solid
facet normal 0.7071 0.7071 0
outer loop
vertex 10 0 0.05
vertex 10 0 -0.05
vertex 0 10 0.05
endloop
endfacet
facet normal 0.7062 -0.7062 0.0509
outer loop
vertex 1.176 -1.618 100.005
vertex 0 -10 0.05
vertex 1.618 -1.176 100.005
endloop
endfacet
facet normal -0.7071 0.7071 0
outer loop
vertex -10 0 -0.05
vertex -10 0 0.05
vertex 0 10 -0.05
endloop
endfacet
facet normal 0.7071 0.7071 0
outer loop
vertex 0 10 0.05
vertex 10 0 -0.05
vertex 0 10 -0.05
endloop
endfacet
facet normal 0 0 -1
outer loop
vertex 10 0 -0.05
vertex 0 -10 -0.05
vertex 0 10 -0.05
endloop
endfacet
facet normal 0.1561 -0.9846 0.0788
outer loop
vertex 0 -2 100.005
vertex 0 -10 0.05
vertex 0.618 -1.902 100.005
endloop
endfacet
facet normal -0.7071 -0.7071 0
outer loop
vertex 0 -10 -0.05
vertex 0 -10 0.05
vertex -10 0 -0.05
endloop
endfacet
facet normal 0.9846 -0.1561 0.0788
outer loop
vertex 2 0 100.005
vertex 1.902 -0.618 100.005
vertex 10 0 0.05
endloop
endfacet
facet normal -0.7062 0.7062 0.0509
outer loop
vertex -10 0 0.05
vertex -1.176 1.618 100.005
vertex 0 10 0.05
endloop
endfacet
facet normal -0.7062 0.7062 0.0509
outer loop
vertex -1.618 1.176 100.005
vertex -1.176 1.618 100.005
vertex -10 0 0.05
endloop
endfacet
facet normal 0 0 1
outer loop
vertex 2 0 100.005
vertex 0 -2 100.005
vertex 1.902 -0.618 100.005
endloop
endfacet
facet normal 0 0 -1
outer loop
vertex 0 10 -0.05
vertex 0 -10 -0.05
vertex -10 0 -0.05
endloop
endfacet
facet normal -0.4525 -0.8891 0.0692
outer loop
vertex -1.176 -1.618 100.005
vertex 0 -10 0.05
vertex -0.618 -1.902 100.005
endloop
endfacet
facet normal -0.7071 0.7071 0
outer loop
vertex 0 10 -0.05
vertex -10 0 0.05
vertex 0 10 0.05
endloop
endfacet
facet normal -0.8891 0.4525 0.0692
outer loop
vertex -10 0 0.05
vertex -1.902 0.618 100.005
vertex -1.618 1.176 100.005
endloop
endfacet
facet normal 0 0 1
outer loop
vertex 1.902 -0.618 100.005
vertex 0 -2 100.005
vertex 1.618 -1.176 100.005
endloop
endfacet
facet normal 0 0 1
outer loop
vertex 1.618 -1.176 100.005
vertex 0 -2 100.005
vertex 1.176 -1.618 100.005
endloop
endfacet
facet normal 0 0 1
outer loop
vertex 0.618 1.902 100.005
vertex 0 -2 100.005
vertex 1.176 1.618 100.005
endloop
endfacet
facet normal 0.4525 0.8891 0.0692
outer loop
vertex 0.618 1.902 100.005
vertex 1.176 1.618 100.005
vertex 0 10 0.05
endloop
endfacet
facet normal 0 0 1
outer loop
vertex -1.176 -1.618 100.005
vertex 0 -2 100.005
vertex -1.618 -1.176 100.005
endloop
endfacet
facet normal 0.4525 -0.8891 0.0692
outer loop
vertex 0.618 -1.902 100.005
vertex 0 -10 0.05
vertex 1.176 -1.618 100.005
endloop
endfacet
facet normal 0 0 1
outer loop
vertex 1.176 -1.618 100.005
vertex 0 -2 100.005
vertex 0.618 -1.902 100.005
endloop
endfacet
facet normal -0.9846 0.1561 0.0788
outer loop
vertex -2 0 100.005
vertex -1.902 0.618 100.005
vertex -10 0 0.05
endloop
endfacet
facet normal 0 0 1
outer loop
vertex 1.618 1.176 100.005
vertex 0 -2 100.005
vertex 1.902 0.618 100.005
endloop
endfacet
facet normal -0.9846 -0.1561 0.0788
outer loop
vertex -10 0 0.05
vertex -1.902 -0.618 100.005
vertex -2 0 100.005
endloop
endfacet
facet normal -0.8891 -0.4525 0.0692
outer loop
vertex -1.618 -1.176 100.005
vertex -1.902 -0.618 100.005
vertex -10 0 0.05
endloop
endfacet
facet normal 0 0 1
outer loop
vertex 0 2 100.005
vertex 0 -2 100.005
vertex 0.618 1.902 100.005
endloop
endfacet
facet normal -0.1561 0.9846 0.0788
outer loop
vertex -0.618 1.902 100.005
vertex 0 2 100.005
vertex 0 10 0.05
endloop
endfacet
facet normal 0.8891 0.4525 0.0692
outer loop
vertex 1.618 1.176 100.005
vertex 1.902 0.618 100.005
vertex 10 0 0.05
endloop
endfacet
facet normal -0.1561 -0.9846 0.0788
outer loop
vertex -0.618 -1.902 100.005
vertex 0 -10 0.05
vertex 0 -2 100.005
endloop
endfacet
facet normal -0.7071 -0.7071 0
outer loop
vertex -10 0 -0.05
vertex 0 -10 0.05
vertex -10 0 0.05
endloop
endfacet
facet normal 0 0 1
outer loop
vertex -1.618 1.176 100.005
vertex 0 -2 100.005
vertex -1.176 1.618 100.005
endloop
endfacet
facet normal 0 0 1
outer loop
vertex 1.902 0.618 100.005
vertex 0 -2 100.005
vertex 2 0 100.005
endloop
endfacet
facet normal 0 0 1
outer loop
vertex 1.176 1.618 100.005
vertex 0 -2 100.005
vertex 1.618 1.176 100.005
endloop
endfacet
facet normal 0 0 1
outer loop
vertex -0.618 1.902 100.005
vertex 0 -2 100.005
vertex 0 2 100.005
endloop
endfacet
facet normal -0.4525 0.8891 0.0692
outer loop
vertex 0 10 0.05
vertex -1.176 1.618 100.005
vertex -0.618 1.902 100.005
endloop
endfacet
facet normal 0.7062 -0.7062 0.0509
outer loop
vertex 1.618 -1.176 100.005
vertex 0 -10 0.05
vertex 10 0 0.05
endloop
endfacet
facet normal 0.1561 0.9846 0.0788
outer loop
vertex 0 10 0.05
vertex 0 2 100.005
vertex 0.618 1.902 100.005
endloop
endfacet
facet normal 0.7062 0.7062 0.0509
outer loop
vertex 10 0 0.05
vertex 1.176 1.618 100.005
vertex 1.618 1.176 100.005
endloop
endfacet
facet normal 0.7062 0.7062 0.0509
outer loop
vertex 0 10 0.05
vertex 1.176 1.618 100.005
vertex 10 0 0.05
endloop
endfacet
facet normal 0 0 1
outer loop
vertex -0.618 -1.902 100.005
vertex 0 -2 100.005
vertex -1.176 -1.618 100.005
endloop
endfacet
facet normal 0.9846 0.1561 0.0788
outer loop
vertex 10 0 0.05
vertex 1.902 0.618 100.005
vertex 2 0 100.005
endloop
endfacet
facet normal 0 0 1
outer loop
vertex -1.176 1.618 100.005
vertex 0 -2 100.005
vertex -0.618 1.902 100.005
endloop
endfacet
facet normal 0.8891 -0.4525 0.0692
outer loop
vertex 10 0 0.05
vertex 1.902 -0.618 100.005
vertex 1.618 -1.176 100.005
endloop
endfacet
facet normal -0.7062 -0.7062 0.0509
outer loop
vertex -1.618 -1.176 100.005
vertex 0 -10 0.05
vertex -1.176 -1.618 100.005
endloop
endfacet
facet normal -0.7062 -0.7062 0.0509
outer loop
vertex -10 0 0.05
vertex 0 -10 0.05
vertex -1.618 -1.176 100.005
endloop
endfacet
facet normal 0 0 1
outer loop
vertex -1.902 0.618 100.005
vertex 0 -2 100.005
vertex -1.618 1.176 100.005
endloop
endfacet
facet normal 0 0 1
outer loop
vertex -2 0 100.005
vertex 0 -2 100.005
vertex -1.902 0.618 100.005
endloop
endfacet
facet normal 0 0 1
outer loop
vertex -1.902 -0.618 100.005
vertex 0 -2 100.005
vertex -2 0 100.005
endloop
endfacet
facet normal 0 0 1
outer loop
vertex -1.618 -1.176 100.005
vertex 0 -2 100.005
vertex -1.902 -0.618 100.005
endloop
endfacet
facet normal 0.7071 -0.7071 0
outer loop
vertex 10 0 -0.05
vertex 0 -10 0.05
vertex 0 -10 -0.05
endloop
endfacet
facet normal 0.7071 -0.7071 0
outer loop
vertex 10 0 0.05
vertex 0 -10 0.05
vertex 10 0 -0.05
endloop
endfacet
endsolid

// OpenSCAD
hull() {
cylinder(r=10, h=0.1, center=true,$fn=4);

translate([0, 0, 100]) {
  cylinder(r=2, h=0.01, center=true,$fn=20);
}
}
